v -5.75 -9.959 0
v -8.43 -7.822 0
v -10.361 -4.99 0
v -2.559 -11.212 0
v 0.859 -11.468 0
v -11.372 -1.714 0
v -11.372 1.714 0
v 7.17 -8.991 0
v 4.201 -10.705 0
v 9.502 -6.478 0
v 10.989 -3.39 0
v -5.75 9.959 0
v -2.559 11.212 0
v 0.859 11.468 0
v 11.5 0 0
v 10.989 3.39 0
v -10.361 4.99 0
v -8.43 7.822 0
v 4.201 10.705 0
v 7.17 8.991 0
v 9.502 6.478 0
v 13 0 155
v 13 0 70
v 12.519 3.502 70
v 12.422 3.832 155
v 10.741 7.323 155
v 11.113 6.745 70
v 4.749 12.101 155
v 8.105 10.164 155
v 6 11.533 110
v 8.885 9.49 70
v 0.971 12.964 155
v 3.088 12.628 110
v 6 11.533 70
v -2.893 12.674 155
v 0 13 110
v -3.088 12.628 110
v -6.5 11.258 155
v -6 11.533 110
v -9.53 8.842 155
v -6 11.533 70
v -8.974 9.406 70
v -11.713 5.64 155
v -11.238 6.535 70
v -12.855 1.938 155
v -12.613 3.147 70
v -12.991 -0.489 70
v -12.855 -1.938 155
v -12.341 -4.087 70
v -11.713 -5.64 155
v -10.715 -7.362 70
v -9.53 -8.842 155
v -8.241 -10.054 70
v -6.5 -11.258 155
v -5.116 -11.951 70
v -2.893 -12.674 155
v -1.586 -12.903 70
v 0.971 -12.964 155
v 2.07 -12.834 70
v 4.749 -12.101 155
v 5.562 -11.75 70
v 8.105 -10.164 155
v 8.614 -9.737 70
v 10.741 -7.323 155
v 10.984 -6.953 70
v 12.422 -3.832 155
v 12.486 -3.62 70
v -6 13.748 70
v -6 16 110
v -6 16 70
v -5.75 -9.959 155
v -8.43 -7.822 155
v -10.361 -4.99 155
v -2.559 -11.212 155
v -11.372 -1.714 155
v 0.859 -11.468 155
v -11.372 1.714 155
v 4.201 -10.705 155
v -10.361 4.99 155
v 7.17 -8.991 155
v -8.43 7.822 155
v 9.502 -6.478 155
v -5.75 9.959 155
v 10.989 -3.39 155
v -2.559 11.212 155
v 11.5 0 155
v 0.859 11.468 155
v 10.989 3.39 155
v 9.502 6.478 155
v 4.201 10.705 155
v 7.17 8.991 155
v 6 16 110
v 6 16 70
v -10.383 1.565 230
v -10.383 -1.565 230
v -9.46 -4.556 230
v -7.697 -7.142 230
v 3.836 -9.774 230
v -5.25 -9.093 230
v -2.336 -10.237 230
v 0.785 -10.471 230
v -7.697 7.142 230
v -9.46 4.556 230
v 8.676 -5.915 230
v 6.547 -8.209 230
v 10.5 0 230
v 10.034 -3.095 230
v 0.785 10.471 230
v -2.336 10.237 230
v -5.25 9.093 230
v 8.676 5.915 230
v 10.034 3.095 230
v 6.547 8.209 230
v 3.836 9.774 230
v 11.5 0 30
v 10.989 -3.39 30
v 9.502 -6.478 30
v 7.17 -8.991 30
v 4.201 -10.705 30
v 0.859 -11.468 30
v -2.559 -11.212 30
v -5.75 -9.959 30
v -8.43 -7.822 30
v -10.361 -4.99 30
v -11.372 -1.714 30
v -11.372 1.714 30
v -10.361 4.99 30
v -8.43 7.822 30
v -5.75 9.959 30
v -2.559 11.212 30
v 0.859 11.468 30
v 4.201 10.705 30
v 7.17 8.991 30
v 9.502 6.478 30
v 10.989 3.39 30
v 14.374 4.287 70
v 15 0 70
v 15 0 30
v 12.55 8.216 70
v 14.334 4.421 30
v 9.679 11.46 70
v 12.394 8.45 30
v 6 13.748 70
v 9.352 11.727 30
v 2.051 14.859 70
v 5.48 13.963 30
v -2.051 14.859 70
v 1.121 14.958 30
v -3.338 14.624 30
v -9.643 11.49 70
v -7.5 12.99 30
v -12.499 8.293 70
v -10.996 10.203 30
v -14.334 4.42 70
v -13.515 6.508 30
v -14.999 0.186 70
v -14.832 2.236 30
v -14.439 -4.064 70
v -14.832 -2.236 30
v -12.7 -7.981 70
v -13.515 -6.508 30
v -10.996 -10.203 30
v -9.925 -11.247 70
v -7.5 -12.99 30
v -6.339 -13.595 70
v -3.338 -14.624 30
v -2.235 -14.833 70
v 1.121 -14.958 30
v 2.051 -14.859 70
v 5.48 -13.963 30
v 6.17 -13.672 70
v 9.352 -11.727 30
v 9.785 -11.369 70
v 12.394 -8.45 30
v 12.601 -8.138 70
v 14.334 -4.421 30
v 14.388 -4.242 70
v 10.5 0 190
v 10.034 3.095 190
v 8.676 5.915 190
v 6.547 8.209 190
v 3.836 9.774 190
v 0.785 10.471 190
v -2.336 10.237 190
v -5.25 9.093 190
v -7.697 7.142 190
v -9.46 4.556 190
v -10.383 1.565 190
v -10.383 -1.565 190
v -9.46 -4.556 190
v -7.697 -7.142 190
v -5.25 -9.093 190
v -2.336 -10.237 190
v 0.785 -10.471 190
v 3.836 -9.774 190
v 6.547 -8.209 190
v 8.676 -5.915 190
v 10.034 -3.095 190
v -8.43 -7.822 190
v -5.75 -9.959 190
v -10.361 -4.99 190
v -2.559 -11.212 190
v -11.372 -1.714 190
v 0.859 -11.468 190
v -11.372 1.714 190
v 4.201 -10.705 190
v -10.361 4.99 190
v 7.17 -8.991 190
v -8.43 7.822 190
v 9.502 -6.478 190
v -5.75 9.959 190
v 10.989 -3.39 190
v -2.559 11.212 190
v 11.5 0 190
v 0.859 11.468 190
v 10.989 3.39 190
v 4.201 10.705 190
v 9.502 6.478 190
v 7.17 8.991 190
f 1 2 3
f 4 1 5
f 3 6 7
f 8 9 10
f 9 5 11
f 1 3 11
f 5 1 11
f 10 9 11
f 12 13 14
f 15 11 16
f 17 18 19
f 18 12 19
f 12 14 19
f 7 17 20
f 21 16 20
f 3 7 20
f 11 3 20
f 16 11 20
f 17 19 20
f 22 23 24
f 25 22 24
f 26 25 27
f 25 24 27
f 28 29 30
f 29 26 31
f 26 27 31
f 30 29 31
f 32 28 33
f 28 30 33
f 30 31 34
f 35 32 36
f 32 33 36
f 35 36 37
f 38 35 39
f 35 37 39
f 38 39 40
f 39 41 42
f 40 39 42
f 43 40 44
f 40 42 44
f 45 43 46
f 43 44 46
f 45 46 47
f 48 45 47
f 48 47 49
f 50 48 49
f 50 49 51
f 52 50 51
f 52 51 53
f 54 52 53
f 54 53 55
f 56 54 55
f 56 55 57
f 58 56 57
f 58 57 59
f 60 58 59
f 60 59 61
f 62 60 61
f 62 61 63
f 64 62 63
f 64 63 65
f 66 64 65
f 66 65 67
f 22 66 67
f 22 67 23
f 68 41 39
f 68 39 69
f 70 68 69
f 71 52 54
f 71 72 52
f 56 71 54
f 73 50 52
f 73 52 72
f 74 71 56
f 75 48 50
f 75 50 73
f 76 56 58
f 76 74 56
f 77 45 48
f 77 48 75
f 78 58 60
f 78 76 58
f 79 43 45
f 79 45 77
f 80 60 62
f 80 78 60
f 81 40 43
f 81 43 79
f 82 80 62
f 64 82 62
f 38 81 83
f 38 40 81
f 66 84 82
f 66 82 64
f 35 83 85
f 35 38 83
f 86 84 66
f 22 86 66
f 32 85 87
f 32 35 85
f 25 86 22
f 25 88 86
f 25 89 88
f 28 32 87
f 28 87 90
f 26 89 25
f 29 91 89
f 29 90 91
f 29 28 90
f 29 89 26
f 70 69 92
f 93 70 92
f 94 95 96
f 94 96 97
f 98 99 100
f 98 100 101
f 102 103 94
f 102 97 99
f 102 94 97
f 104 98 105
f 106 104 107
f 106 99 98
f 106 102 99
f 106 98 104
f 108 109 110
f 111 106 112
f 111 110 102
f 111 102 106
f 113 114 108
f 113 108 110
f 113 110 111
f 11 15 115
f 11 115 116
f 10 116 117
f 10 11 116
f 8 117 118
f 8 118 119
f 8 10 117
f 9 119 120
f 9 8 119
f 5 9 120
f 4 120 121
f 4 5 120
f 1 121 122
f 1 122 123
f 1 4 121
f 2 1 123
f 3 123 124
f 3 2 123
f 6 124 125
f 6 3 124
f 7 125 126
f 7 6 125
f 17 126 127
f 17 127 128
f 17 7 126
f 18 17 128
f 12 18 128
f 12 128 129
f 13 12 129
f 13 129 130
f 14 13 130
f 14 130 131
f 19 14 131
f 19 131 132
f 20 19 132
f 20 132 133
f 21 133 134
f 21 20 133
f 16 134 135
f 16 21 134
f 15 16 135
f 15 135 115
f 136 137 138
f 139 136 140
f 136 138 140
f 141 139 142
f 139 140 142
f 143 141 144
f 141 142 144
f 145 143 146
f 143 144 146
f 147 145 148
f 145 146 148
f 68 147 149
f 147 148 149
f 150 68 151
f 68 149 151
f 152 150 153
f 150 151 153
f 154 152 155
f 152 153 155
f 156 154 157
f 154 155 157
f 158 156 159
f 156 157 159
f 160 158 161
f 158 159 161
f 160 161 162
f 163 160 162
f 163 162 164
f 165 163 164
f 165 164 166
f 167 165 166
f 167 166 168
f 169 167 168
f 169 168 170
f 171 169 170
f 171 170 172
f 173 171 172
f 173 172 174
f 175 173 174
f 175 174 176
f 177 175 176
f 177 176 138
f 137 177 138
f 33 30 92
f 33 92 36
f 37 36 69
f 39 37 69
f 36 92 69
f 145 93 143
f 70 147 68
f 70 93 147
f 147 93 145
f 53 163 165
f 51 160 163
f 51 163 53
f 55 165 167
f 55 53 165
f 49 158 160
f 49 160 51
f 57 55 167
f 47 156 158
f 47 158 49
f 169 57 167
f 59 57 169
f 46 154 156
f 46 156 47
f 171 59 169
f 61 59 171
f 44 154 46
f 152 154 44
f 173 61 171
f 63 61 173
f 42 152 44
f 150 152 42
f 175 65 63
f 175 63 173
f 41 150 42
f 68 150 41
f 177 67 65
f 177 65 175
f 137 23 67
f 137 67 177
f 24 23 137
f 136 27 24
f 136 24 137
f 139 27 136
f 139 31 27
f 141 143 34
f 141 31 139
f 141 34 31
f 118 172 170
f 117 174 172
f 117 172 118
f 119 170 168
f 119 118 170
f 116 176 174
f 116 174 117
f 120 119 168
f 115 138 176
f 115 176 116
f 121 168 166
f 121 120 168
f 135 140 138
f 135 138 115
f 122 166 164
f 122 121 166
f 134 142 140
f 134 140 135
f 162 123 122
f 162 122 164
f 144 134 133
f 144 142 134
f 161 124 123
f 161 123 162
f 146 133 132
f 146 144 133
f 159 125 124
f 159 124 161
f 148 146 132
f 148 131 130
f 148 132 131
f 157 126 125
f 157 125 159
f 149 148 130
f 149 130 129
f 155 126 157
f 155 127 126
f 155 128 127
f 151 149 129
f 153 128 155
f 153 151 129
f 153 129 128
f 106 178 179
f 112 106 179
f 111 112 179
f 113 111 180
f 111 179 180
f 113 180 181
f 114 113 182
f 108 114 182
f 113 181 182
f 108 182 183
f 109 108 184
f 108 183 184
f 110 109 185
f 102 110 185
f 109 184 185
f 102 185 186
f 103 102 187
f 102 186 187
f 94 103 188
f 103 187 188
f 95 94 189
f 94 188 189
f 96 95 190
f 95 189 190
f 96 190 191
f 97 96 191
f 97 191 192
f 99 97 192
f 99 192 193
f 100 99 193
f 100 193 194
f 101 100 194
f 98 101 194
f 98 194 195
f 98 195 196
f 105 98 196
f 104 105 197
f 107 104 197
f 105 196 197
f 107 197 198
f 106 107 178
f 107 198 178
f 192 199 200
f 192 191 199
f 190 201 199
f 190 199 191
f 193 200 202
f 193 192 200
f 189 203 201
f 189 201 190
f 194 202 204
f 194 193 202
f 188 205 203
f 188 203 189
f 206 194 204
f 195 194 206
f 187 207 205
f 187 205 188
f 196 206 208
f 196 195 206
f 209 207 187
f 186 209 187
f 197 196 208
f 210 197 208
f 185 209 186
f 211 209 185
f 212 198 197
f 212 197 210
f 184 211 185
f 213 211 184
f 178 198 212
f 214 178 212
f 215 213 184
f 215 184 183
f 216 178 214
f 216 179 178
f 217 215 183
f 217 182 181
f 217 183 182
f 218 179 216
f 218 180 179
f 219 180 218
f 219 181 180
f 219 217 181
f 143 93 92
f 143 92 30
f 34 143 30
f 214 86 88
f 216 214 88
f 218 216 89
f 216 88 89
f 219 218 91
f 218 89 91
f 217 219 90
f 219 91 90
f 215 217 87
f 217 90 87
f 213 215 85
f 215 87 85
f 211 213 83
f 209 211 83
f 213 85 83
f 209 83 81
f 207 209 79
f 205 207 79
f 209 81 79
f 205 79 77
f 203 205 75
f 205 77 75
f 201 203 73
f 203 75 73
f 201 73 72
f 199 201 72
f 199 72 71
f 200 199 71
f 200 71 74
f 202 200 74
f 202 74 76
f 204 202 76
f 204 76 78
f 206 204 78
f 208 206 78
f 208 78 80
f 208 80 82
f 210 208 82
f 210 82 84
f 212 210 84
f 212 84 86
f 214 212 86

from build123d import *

# Parameters (mm, degrees)
SKETCH2_R           = 15
BOSS_EXTRUDE1_DEPTH = 230
CUT_EXTRUDE1_START  = -160
SKETCH3_R           = 15
SKETCH3_R_2         = 13
CUT_EXTRUDE1_DEPTH  = 160
CUT_EXTRUDE3_START  = -75
SKETCH4_R           = 13
SKETCH4_R_2         = 11.5
CUT_EXTRUDE3_DEPTH  = 75
CUT_EXTRUDE4_START  = -40
SKETCH5_R           = 11.5
SKETCH5_R_2         = 10.5
CUT_EXTRUDE4_DEPTH  = 40
SKETCH6_R           = 15
SKETCH6_R_2         = 11.5
CUT_EXTRUDE5_DEPTH  = 30
BOSS_EXTRUDE2_DEPTH = 40


with BuildPart() as part:
    # Sketch2 → Boss-Extrude1 (new body)
    with BuildSketch(Plane.XY):
        Circle(SKETCH2_R)
    extrude(amount=BOSS_EXTRUDE1_DEPTH)

    # Sketch3 → Cut-Extrude1 (cut)
    with BuildSketch(Plane.XY.offset(230).offset(CUT_EXTRUDE1_START)):
        Circle(SKETCH3_R)
        Circle(SKETCH3_R_2, mode=Mode.SUBTRACT)
    extrude(amount=CUT_EXTRUDE1_DEPTH, mode=Mode.SUBTRACT)

    # Sketch4 → Cut-Extrude3 (cut)
    with BuildSketch(Plane.XY.offset(230).offset(CUT_EXTRUDE3_START)):
        Circle(SKETCH4_R)
        Circle(SKETCH4_R_2, mode=Mode.SUBTRACT)
    extrude(amount=CUT_EXTRUDE3_DEPTH, mode=Mode.SUBTRACT)

    # Sketch5 → Cut-Extrude4 (cut)
    with BuildSketch(Plane.XY.offset(230).offset(CUT_EXTRUDE4_START)):
        Circle(SKETCH5_R)
        Circle(SKETCH5_R_2, mode=Mode.SUBTRACT)
    extrude(amount=CUT_EXTRUDE4_DEPTH, mode=Mode.SUBTRACT)

    # Sketch6 → Cut-Extrude5 (cut)
    with BuildSketch(Plane(origin=(0, 0, 0), x_dir=(-1, 0, 0), z_dir=(0, 0, -1))):
        Circle(SKETCH6_R)
        with Locations(Location((0, 0, 0), (0, 0, 180))):
            Circle(SKETCH6_R_2, mode=Mode.SUBTRACT)
    extrude(amount=-CUT_EXTRUDE5_DEPTH, mode=Mode.SUBTRACT)

    # Sketch8 → Boss-Extrude2 (add)
    with BuildSketch(Plane.XY.offset(70)):
        with BuildLine():
            Line((-6, 16), (6, 16))
            Line((6, 16), (6, 11.532562595))
            ThreePointArc((6, 11.532562595), (0, 13), (-6, 11.532562595))
            Line((-6, 11.532562595), (-6, 16))
        make_face()
    extrude(amount=BOSS_EXTRUDE2_DEPTH)


solid = part.part
